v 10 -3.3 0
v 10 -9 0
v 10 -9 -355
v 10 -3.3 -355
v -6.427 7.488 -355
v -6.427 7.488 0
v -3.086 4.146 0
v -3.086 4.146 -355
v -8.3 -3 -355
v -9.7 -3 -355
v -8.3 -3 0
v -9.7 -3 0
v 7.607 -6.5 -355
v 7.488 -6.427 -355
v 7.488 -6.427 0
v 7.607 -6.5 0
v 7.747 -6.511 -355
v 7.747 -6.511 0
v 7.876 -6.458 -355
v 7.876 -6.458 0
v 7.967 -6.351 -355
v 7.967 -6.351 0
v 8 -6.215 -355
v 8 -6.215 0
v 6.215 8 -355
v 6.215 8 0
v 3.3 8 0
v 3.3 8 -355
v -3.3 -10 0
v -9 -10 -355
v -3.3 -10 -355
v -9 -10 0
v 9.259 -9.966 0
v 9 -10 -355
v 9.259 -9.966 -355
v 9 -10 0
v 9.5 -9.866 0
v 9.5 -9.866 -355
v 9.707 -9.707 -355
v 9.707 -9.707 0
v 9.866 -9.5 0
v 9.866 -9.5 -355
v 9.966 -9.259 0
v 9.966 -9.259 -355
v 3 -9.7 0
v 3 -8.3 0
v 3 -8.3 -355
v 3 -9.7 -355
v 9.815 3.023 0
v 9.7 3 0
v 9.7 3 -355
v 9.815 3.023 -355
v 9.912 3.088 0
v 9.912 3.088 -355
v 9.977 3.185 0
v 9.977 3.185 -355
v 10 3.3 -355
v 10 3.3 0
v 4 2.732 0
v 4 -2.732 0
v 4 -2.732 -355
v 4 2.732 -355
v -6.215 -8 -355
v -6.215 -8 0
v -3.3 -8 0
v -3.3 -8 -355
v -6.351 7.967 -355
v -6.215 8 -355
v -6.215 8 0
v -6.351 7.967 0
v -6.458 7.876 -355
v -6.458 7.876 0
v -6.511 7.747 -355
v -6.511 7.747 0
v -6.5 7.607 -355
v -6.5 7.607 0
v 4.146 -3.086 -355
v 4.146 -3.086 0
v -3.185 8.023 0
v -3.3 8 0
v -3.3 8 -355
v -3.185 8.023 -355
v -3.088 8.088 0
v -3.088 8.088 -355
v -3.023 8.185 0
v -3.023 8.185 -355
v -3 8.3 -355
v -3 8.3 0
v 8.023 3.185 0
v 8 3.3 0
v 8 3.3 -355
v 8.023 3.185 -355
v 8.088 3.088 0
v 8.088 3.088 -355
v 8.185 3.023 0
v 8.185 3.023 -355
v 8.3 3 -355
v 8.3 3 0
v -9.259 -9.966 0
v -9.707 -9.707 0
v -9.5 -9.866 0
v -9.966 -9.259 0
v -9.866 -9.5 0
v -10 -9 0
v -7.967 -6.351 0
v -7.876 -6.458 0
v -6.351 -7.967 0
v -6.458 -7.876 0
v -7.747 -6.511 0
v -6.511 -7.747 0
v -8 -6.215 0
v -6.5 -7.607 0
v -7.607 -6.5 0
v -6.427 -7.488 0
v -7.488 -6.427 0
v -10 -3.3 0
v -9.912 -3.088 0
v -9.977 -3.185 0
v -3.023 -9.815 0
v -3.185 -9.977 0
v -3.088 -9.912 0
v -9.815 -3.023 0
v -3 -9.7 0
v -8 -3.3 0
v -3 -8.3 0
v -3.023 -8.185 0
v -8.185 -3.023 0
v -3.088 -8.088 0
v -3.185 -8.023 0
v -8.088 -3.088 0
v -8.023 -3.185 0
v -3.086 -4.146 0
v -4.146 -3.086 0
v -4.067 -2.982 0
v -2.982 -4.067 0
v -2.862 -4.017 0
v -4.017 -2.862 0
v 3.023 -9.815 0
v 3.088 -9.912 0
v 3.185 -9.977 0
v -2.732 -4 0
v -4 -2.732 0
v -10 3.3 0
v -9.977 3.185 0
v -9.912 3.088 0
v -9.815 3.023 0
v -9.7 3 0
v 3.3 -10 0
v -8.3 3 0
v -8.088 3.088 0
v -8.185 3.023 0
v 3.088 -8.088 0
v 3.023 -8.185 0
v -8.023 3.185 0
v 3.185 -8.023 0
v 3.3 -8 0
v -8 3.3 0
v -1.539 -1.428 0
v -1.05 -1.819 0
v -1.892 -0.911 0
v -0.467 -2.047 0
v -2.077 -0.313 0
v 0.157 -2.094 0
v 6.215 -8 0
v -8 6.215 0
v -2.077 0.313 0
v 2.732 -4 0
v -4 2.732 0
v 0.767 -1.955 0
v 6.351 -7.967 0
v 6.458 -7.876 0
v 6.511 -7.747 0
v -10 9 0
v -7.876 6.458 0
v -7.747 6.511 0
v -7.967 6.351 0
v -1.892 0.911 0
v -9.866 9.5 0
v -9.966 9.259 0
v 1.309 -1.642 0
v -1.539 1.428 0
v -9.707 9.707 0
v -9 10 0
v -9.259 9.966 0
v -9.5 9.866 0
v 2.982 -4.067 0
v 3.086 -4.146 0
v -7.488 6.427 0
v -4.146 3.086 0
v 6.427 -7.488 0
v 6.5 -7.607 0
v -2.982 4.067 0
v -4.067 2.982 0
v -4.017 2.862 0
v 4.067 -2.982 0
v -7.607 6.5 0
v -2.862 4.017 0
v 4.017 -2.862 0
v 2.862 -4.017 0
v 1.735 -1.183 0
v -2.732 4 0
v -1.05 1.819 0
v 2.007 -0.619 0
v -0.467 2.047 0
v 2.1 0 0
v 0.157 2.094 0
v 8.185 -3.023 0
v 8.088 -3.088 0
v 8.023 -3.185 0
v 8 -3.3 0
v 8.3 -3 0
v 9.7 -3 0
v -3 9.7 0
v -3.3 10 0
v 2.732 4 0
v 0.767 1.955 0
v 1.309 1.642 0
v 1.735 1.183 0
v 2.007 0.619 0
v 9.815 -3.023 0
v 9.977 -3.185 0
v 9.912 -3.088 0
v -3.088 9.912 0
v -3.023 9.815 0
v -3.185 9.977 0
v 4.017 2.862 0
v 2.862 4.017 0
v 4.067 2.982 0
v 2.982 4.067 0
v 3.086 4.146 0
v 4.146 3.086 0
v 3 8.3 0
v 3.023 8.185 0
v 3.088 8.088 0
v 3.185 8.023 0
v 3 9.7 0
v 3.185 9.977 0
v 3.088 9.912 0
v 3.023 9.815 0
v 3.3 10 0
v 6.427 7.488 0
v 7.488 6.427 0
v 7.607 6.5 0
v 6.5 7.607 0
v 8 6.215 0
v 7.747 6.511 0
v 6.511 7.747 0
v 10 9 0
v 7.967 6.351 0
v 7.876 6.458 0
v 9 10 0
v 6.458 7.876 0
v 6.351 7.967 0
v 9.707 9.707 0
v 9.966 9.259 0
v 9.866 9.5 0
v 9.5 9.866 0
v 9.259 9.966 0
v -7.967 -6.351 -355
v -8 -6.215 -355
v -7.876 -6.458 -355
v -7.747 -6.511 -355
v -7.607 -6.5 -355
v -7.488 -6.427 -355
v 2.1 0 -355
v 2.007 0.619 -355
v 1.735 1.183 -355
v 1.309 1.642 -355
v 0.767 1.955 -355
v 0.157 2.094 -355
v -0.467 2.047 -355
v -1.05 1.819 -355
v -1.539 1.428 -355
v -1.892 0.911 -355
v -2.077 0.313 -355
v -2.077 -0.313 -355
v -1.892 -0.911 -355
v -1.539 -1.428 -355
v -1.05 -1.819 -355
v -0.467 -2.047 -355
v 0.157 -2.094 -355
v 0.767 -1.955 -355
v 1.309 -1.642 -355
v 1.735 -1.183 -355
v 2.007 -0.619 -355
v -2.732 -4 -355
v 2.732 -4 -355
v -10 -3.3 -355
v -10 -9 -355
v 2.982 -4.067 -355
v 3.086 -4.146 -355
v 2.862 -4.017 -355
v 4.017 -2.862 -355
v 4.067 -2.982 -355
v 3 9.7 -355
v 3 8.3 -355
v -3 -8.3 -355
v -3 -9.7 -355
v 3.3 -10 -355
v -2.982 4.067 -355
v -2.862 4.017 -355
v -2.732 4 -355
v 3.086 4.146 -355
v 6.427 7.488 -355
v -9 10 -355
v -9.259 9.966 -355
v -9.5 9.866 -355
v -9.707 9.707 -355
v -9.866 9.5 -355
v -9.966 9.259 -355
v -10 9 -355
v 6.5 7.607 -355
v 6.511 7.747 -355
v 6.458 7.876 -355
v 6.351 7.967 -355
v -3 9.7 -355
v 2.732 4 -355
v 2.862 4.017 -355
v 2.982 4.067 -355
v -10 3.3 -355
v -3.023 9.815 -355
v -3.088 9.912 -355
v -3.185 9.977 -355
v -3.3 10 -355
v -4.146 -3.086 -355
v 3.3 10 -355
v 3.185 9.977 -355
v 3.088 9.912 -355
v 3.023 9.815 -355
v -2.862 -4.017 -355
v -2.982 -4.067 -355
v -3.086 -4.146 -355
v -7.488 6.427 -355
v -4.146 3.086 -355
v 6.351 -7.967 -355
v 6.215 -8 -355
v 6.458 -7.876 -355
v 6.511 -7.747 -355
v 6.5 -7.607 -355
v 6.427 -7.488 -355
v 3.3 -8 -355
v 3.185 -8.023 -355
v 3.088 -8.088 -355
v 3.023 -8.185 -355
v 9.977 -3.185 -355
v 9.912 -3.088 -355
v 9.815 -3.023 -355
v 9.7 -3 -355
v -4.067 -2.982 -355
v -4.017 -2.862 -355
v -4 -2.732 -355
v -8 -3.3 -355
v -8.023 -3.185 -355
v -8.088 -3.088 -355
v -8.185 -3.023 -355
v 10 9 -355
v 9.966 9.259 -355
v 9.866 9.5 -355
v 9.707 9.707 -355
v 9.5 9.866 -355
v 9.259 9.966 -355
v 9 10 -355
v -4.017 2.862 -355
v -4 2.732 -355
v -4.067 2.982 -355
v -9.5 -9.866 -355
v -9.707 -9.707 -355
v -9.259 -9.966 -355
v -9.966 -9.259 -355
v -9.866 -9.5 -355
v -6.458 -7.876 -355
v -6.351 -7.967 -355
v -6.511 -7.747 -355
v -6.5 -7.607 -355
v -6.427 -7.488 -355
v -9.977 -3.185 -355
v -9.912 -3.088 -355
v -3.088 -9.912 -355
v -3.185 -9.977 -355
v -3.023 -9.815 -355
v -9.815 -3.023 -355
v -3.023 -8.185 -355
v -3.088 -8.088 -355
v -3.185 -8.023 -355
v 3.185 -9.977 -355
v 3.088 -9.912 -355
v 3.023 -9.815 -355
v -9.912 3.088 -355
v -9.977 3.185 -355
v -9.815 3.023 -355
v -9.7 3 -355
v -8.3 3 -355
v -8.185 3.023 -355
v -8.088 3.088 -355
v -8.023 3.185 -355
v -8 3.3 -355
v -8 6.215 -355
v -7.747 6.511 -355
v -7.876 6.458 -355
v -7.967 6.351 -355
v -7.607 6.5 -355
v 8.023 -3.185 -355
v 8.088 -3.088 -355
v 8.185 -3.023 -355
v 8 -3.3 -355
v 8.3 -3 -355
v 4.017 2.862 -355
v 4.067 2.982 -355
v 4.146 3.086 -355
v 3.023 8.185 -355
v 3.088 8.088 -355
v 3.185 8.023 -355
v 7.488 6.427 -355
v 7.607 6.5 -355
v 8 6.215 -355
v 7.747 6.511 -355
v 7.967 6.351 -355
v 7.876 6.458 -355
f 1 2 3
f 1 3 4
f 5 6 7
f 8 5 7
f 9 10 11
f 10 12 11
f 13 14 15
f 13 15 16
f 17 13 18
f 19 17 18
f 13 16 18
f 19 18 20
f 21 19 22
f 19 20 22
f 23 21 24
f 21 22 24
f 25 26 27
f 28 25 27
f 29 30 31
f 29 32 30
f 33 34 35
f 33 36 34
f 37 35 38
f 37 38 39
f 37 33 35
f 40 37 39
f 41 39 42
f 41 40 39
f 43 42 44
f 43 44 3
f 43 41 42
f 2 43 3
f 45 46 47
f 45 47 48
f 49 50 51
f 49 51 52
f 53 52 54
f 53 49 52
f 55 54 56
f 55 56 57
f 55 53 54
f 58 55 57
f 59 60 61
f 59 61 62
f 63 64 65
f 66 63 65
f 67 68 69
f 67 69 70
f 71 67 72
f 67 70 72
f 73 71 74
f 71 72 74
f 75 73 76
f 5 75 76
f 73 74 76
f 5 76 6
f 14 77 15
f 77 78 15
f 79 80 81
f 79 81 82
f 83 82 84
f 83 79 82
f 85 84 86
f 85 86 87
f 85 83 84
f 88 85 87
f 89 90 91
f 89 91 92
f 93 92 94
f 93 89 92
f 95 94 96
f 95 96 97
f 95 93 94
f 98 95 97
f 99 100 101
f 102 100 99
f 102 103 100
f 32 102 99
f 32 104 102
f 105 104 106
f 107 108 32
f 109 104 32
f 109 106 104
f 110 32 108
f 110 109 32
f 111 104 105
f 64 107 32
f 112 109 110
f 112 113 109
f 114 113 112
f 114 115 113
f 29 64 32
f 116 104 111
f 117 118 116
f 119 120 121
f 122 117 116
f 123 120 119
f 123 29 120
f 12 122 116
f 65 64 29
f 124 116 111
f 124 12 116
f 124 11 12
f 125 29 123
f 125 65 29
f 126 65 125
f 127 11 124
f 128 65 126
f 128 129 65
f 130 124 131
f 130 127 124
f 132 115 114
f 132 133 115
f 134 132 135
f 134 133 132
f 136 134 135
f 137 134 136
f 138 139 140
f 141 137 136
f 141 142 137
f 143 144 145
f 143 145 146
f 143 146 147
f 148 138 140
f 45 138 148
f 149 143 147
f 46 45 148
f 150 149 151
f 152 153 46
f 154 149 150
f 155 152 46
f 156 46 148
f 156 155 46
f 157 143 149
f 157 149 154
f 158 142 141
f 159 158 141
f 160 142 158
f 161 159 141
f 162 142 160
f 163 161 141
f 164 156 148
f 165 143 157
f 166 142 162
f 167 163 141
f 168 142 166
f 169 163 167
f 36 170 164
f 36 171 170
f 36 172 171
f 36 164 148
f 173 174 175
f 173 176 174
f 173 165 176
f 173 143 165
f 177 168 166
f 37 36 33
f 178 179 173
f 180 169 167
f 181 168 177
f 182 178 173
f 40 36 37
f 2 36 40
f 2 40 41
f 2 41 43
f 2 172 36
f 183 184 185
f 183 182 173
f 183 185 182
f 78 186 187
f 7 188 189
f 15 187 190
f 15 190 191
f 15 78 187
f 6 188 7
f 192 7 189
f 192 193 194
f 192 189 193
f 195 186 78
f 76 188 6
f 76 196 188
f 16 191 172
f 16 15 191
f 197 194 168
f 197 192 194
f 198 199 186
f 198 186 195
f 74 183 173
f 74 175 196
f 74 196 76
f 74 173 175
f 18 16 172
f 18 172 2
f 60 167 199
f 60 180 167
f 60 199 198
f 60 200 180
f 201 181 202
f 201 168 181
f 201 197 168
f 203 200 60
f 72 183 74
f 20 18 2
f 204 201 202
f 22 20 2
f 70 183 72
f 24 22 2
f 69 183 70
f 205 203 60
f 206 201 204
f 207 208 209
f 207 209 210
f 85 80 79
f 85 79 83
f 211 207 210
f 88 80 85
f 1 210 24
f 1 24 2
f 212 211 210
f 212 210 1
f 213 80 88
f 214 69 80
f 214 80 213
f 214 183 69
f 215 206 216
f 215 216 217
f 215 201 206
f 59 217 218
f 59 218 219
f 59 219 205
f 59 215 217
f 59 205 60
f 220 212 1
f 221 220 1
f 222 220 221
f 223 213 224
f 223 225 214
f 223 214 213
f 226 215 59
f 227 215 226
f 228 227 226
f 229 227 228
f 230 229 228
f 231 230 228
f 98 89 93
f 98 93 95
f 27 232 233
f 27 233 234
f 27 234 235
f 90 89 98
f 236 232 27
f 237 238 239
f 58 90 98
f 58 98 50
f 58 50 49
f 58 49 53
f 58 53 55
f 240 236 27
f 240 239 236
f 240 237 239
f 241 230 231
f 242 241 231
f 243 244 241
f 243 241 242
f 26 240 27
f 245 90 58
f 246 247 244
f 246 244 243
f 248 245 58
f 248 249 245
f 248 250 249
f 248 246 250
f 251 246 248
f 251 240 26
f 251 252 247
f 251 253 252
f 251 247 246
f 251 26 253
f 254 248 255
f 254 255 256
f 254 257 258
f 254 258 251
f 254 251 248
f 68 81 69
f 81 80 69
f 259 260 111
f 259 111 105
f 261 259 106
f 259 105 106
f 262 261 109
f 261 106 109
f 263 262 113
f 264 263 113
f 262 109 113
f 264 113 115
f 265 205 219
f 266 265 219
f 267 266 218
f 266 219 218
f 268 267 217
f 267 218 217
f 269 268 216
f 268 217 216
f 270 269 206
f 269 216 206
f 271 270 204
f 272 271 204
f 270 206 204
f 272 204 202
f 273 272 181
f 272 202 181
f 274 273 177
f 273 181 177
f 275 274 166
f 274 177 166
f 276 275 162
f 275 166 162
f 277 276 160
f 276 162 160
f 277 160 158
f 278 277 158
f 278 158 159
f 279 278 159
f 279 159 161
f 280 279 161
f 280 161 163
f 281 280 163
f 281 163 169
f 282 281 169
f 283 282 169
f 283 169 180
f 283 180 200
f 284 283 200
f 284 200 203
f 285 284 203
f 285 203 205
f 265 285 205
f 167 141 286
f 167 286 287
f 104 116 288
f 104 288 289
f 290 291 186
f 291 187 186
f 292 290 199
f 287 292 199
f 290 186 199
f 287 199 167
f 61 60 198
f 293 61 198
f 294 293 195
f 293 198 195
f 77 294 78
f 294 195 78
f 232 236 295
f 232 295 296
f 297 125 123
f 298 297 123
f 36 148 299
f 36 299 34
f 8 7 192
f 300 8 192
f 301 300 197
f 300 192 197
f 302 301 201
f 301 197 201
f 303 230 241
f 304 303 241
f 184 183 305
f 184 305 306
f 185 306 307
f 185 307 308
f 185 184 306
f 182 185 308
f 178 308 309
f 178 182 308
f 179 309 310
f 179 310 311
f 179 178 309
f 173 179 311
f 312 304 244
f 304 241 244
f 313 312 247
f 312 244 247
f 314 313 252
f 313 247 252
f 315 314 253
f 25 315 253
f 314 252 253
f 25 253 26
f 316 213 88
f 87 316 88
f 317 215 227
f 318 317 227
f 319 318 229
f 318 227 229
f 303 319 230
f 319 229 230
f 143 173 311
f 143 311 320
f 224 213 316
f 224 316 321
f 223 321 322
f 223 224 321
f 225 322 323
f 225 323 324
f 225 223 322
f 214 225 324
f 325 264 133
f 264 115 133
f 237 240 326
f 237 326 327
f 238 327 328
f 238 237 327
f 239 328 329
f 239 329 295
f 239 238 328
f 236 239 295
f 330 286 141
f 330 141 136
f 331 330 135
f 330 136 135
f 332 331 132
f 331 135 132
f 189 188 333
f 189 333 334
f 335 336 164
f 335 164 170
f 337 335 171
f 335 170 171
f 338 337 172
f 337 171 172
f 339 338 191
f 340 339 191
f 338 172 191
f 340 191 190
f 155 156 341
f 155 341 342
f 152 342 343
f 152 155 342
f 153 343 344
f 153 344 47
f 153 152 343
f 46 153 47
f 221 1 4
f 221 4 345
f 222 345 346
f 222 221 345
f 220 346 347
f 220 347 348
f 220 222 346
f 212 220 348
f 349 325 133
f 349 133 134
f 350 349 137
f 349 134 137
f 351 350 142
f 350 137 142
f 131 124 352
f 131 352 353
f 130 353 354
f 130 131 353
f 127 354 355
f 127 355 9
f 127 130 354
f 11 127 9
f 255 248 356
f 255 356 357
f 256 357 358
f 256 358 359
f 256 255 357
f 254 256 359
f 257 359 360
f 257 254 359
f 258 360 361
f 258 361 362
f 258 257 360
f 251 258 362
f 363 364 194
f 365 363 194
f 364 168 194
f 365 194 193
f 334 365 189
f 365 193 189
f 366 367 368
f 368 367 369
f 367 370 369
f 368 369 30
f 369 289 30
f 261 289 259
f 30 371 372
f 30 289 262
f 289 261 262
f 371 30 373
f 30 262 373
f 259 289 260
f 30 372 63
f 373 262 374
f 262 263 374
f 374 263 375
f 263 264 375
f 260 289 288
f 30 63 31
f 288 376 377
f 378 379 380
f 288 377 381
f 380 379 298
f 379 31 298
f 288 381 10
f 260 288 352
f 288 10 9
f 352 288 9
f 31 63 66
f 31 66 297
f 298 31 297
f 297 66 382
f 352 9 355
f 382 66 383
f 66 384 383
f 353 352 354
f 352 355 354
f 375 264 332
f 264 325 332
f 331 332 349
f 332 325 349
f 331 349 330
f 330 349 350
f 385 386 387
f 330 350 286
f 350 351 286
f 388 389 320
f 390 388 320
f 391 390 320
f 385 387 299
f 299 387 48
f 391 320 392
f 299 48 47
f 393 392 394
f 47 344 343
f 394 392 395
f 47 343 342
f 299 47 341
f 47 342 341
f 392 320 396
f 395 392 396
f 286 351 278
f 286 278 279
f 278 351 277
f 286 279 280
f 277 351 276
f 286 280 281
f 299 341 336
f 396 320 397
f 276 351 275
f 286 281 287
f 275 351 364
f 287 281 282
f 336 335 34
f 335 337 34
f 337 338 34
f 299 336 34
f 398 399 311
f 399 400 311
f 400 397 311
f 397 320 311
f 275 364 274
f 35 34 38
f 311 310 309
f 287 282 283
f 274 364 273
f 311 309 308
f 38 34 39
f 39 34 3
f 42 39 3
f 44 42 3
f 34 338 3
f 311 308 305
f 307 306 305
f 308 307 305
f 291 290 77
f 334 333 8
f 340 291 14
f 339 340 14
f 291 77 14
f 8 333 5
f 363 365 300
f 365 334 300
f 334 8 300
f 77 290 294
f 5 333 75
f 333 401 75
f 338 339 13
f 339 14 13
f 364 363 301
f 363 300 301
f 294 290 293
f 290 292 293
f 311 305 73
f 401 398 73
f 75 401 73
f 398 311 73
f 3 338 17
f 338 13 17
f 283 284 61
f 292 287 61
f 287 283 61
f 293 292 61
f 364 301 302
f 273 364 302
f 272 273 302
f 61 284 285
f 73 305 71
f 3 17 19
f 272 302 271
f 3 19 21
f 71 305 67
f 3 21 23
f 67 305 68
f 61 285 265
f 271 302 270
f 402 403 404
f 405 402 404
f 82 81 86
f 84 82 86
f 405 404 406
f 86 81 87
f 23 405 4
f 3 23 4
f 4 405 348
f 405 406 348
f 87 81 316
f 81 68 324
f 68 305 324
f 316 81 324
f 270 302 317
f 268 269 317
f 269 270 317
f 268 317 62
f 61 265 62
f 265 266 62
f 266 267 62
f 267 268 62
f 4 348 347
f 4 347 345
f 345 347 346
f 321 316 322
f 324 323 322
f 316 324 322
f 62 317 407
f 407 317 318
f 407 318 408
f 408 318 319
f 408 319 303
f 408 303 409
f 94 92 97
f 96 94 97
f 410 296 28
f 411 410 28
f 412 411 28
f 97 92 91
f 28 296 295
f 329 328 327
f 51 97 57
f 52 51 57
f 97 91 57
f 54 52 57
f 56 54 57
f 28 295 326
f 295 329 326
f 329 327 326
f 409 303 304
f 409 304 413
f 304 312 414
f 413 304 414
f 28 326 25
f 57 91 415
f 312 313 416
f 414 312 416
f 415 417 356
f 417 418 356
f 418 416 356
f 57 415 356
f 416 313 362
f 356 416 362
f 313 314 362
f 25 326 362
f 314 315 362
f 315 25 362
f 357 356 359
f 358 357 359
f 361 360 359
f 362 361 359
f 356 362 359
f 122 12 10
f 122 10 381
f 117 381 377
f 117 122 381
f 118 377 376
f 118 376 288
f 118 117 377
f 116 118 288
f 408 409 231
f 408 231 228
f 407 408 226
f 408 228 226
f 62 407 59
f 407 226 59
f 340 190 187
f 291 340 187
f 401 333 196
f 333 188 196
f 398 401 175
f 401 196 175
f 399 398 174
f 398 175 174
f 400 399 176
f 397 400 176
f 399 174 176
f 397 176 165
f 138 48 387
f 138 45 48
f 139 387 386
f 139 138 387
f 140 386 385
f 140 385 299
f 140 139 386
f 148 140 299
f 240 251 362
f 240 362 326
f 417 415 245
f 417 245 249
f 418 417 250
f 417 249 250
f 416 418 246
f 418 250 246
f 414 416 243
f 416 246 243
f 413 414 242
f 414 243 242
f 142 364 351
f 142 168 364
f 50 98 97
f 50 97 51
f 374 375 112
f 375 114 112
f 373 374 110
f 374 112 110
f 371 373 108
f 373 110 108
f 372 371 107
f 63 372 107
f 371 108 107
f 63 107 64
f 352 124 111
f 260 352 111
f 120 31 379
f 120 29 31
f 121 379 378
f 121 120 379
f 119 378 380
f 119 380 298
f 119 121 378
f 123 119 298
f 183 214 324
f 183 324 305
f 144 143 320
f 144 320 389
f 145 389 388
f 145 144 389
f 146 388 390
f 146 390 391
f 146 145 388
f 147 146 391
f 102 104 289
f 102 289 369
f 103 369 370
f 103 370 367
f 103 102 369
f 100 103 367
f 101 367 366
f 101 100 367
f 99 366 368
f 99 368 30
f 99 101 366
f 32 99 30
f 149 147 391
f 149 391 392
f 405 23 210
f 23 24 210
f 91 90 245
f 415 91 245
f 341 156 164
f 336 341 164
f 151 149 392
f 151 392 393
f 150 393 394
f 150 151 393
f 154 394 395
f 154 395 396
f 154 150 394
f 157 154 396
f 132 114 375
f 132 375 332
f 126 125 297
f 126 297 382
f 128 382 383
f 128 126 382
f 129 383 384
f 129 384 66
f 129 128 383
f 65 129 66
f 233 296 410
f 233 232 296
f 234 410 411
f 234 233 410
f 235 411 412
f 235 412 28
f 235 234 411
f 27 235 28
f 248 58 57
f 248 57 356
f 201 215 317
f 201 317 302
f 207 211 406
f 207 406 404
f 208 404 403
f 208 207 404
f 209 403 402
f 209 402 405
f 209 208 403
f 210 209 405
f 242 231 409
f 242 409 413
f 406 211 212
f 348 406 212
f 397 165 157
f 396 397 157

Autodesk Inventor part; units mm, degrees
ref_plane "YZ Plane" through (0, 0, 0) normal (1, 0, 0) x (0, 1, 0)
ref_plane "XZ Plane" through (0, 0, 0) normal (0, 1, 0) x (-1, 0, 0)
ref_plane "XY Plane" through (0, 0, 0) normal (0, 0, 1) x (1, 0, 0)
sketch "Skizze1" plane through (0, 0, 0) normal (0, 0, 1) x (1, 0, 0)
  line L0 (-28.0083, 0) -> (28.0083, 0) projected
  line L1 (0, -28.0083) -> (0, 28.0083) projected
  line L2 (-14, 0) -> (14, 0)
  line L3 (0, -14) -> (0, 14)
  line L4 (-20.0059, 0) -> (20.0059, 0)
  line L5 (0, -20.0059) -> (0, 20.0059)
  line L6 (-14.2899, 0) -> (14.2899, 0)
  line L7 (0, -14.2899) -> (0, 14.2899)
  line L8 (-10, -10) -> (10, 10) construction
  line L9 (10, -10) -> (-10, 10) construction
  line L10 (-8, -8) -> (8, 8) construction
  line L11 (8, -8) -> (-8, 8) construction
  line L12 (-2.7322, -4) -> (2.7322, -4)
  line L13 (4, -2.7322) -> (4, 2.7322)
  line L14 (2.7322, 4) -> (-2.7322, 4)
  line L15 (-4, 2.7322) -> (-4, -2.7322)
  line L16 (-4, -4) -> (4, 4) construction
  line L17 (4, -4) -> (-4, 4) construction
  arc A0 (-9, 10) -> (-10, 9) centre (-9, 9) ccw
  arc A1 (10, 9) -> (9, 10) centre (9, 9) ccw
  arc A2 (9, -10) -> (10, -9) centre (9, -9) ccw
  arc A3 (-10, -9) -> (-9, -10) centre (-9, -9) ccw
  line L18 (-3, 9.7) -> (-3, 8.3)
  line L19 (3, 9.7) -> (3, 8.3)
  line L20 (6.2151, 8) -> (3.3, 8)
  line L21 (-3.3, 8) -> (-6.2151, 8)
  line L22 (9, 10) -> (3.3, 10)
  line L23 (-3.3, 10) -> (-9, 10)
  line L24 (-9.7, -3) -> (-8.3, -3)
  line L25 (-9.7, 3) -> (-8.3, 3)
  line L26 (-8, 6.2151) -> (-8, 3.3)
  line L27 (-8, -3.3) -> (-8, -6.2151)
  line L28 (-10, 9) -> (-10, 3.3)
  line L29 (-10, -3.3) -> (-10, -9)
  line L30 (-3, -8.3) -> (-3, -9.7)
  line L31 (3, -8.3) -> (3, -9.7)
  line L32 (-9, -10) -> (-3.3, -10)
  line L33 (3.3, -10) -> (9, -10)
  line L34 (-6.2151, -8) -> (-3.3, -8)
  line L35 (3.3, -8) -> (6.2151, -8)
  line L36 (8.3, 3) -> (9.7, 3)
  line L37 (8.3, -3) -> (9.7, -3)
  line L38 (8, -6.2151) -> (8, -3.3)
  line L39 (8, 3.3) -> (8, 6.2151)
  line L40 (10, -9) -> (10, -3.3)
  line L41 (10, 3.3) -> (10, 9)
  arc A4 (-10, 3.3) -> (-9.7, 3) centre (-9.7, 3.3) ccw
  arc A5 (-8.3, 3) -> (-8, 3.3) centre (-8.3, 3.3) ccw
  arc A6 (-9.7, -3) -> (-10, -3.3) centre (-9.7, -3.3) ccw
  arc A7 (-8, -3.3) -> (-8.3, -3) centre (-8.3, -3.3) ccw
  arc A8 (-3.3, -10) -> (-3, -9.7) centre (-3.3, -9.7) ccw
  arc A9 (-3, -8.3) -> (-3.3, -8) centre (-3.3, -8.3) ccw
  arc A10 (3, -9.7) -> (3.3, -10) centre (3.3, -9.7) ccw
  arc A11 (3.3, -8) -> (3, -8.3) centre (3.3, -8.3) ccw
  arc A12 (8.3, -3) -> (8, -3.3) centre (8.3, -3.3) ccw
  arc A13 (10, -3.3) -> (9.7, -3) centre (9.7, -3.3) ccw
  arc A14 (8, 3.3) -> (8.3, 3) centre (8.3, 3.3) ccw
  arc A15 (9.7, 3) -> (10, 3.3) centre (9.7, 3.3) ccw
  arc A16 (3, 8.3) -> (3.3, 8) centre (3.3, 8.3) ccw
  arc A17 (3.3, 10) -> (3, 9.7) centre (3.3, 9.7) ccw
  arc A18 (-3.3, 8) -> (-3, 8.3) centre (-3.3, 8.3) ccw
  arc A19 (-3, 9.7) -> (-3.3, 10) centre (-3.3, 9.7) ccw
  line L42 (-7.4879, 6.4272) -> (-4.1464, 3.0858)
  line L43 (-6.4272, 7.4879) -> (-3.0858, 4.1464)
  line L44 (-6.4272, -7.4879) -> (-3.0858, -4.1464)
  line L45 (-7.4879, -6.4272) -> (-4.1464, -3.0858)
  arc A20 (-7.4879, 6.4272) -> (-8, 6.2151) centre (-7.7, 6.2151) ccw
  arc A21 (-6.2151, 8) -> (-6.4272, 7.4879) centre (-6.2151, 7.7) ccw
  arc A22 (-8, -6.2151) -> (-7.4879, -6.4272) centre (-7.7, -6.2151) ccw
  arc A23 (-6.4272, -7.4879) -> (-6.2151, -8) centre (-6.2151, -7.7) ccw
  line L46 (6.4272, -7.4879) -> (3.0858, -4.1464)
  line L47 (4.1464, -3.0858) -> (7.4879, -6.4272)
  arc A24 (6.2151, -8) -> (6.4272, -7.4879) centre (6.2151, -7.7) ccw
  arc A25 (7.4879, -6.4272) -> (8, -6.2151) centre (7.7, -6.2151) ccw
  line L48 (4.1464, 3.0858) -> (7.4879, 6.4272)
  line L49 (3.0858, 4.1464) -> (6.4272, 7.4879)
  arc A26 (6.4272, 7.4879) -> (6.2151, 8) centre (6.2151, 7.7) ccw
  arc A27 (8, 6.2151) -> (7.4879, 6.4272) centre (7.7, 6.2151) ccw
  arc A28 (-3.0858, 4.1464) -> (-2.7322, 4) centre (-2.7322, 4.5) ccw
  arc A29 (-4, 2.7322) -> (-4.1464, 3.0858) centre (-4.5, 2.7322) ccw
  arc A30 (2.7322, 4) -> (3.0858, 4.1464) centre (2.7322, 4.5) ccw
  arc A31 (4.1464, 3.0858) -> (4, 2.7322) centre (4.5, 2.7322) ccw
  arc A32 (-4.1464, -3.0858) -> (-4, -2.7322) centre (-4.5, -2.7322) ccw
  arc A33 (-2.7322, -4) -> (-3.0858, -4.1464) centre (-2.7322, -4.5) ccw
  arc A34 (3.0858, -4.1464) -> (2.7322, -4) centre (2.7322, -4.5) ccw
  arc A35 (4, -2.7322) -> (4.1464, -3.0858) centre (4.5, -2.7322) ccw
  circle A36 centre (0, 0) radius 2.1
  point P0 (-3, 9.1415)
  point P1 (3, 8.9014)
  point P2 (-8.9764, -3)
  point P3 (-9.1265, 3)
  point P4 (-3, -9.1251)
  point P5 (3, -9.1251)
  point P6 (9.1101, 3)
  point P7 (9.1101, -3)
  dimension "d0" = 20
  dimension "d1" = 20
  dimension "d2" = 16
  dimension "d3" = 16
  dimension "d4" = 8
  dimension "d5" = 8
  dimension "d6" = 1
  dimension "d7" = 6
  dimension "d8" = 6
  dimension "d9" = 6
  dimension "d10" = 6
  dimension "d11" = 0.3
  dimension "d12" = 1.5
  dimension "d13" = 1.5
  dimension "d14" = 0.3
  dimension "d15" = 1.5
  dimension "d16" = 0.3
  dimension "d17" = 1.5
  dimension "d18" = 0.3
  dimension "d19" = 0.5
  dimension "d20" = 4.2
  dimension "d21" = 45
  dimension "d22" = 10
  dimension "d23" = 10
  dimension "d24" = 4
  dimension "d25" = 4
  dimension "d26" = 10
  dimension "d27" = 8
  dimension "d28" = 4
  dimension "d29" = 4
  dimension "d30" = 10
  dimension "d31" = 9.1101
  dimension "d32" = 8
  dimension "d33" = 4
  dimension "d34" = 8.9014
  dimension "d35" = 9.1251
  dimension "d36" = 9.1415
  dimension "d37" = 8.9764
  dimension "d38" = 9.1265
extrude "Extrusion1" add sketch "Skizze1" against normal blind 355 contours L15 A29 L42 A20 L26 A5 L25 A4 L28 A0 L23 A19 L18 A18 L21 A21 L43 A28 L14 L1 A36 L0 | L0 A36 L1 L12 A33 L44 A23 L34 A9 L30 A8 L32 A3 L29 A6 L24 A7 L27 A22 L45 A32 L15 | L1 L14 A30 L49 A26 L20 A16 L19 A17 L22 A1 L41 A15 L36 A14 L39 A27 L48 A31 L13 L0 A36 | A36 L0 L13 A35 L47 A25 L38 A12 L37 A13 L40 A2 L33 A10 L31 A11 L35 A24 L46 A34 L12 L1
properties part number "II Strebe senkrecht Türe" material "Aluminium 6061"
